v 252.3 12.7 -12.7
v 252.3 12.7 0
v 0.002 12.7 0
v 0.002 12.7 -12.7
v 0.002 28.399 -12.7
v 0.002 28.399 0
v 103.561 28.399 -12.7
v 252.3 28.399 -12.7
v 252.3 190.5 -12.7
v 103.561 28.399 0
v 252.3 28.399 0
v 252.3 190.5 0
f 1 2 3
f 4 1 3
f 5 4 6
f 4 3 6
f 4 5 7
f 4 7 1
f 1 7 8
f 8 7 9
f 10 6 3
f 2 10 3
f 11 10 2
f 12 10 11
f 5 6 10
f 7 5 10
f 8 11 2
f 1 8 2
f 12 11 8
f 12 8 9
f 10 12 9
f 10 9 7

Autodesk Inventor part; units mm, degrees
ref_plane "YZ Plane" through (0, 0, 0) normal (1, 0, 0) x (0, 1, 0)
ref_plane "XZ Plane" through (0, 0, 0) normal (0, 1, 0) x (-1, 0, 0)
ref_plane "XY Plane" through (0, 0, 0) normal (0, 0, 1) x (1, 0, 0)
sketch "Sketch1" plane through (0, 0, 0) normal (0, 0, 1) x (1, 0, 0)
  line L0 (252.3, 12.7) -> (0.0018, 12.7)
  line L1 (0.0018, 12.7) -> (0.0018, 28.399)
  line L2 (0.0018, 28.399) -> (103.5611, 28.399)
  line L3 (252.3, 28.399) -> (252.3, 12.7)
  line L4 (252.3, 190.5) -> (103.5611, 28.399)
  line L5 (252.3, 28.399) -> (252.3, 190.5)
  point P0 (0, 0)
  point P1 (0, 12.7)
  dimension "d2" = 220
extrude "Extrusion1" add sketch "Sketch1" against normal blind 12.7
